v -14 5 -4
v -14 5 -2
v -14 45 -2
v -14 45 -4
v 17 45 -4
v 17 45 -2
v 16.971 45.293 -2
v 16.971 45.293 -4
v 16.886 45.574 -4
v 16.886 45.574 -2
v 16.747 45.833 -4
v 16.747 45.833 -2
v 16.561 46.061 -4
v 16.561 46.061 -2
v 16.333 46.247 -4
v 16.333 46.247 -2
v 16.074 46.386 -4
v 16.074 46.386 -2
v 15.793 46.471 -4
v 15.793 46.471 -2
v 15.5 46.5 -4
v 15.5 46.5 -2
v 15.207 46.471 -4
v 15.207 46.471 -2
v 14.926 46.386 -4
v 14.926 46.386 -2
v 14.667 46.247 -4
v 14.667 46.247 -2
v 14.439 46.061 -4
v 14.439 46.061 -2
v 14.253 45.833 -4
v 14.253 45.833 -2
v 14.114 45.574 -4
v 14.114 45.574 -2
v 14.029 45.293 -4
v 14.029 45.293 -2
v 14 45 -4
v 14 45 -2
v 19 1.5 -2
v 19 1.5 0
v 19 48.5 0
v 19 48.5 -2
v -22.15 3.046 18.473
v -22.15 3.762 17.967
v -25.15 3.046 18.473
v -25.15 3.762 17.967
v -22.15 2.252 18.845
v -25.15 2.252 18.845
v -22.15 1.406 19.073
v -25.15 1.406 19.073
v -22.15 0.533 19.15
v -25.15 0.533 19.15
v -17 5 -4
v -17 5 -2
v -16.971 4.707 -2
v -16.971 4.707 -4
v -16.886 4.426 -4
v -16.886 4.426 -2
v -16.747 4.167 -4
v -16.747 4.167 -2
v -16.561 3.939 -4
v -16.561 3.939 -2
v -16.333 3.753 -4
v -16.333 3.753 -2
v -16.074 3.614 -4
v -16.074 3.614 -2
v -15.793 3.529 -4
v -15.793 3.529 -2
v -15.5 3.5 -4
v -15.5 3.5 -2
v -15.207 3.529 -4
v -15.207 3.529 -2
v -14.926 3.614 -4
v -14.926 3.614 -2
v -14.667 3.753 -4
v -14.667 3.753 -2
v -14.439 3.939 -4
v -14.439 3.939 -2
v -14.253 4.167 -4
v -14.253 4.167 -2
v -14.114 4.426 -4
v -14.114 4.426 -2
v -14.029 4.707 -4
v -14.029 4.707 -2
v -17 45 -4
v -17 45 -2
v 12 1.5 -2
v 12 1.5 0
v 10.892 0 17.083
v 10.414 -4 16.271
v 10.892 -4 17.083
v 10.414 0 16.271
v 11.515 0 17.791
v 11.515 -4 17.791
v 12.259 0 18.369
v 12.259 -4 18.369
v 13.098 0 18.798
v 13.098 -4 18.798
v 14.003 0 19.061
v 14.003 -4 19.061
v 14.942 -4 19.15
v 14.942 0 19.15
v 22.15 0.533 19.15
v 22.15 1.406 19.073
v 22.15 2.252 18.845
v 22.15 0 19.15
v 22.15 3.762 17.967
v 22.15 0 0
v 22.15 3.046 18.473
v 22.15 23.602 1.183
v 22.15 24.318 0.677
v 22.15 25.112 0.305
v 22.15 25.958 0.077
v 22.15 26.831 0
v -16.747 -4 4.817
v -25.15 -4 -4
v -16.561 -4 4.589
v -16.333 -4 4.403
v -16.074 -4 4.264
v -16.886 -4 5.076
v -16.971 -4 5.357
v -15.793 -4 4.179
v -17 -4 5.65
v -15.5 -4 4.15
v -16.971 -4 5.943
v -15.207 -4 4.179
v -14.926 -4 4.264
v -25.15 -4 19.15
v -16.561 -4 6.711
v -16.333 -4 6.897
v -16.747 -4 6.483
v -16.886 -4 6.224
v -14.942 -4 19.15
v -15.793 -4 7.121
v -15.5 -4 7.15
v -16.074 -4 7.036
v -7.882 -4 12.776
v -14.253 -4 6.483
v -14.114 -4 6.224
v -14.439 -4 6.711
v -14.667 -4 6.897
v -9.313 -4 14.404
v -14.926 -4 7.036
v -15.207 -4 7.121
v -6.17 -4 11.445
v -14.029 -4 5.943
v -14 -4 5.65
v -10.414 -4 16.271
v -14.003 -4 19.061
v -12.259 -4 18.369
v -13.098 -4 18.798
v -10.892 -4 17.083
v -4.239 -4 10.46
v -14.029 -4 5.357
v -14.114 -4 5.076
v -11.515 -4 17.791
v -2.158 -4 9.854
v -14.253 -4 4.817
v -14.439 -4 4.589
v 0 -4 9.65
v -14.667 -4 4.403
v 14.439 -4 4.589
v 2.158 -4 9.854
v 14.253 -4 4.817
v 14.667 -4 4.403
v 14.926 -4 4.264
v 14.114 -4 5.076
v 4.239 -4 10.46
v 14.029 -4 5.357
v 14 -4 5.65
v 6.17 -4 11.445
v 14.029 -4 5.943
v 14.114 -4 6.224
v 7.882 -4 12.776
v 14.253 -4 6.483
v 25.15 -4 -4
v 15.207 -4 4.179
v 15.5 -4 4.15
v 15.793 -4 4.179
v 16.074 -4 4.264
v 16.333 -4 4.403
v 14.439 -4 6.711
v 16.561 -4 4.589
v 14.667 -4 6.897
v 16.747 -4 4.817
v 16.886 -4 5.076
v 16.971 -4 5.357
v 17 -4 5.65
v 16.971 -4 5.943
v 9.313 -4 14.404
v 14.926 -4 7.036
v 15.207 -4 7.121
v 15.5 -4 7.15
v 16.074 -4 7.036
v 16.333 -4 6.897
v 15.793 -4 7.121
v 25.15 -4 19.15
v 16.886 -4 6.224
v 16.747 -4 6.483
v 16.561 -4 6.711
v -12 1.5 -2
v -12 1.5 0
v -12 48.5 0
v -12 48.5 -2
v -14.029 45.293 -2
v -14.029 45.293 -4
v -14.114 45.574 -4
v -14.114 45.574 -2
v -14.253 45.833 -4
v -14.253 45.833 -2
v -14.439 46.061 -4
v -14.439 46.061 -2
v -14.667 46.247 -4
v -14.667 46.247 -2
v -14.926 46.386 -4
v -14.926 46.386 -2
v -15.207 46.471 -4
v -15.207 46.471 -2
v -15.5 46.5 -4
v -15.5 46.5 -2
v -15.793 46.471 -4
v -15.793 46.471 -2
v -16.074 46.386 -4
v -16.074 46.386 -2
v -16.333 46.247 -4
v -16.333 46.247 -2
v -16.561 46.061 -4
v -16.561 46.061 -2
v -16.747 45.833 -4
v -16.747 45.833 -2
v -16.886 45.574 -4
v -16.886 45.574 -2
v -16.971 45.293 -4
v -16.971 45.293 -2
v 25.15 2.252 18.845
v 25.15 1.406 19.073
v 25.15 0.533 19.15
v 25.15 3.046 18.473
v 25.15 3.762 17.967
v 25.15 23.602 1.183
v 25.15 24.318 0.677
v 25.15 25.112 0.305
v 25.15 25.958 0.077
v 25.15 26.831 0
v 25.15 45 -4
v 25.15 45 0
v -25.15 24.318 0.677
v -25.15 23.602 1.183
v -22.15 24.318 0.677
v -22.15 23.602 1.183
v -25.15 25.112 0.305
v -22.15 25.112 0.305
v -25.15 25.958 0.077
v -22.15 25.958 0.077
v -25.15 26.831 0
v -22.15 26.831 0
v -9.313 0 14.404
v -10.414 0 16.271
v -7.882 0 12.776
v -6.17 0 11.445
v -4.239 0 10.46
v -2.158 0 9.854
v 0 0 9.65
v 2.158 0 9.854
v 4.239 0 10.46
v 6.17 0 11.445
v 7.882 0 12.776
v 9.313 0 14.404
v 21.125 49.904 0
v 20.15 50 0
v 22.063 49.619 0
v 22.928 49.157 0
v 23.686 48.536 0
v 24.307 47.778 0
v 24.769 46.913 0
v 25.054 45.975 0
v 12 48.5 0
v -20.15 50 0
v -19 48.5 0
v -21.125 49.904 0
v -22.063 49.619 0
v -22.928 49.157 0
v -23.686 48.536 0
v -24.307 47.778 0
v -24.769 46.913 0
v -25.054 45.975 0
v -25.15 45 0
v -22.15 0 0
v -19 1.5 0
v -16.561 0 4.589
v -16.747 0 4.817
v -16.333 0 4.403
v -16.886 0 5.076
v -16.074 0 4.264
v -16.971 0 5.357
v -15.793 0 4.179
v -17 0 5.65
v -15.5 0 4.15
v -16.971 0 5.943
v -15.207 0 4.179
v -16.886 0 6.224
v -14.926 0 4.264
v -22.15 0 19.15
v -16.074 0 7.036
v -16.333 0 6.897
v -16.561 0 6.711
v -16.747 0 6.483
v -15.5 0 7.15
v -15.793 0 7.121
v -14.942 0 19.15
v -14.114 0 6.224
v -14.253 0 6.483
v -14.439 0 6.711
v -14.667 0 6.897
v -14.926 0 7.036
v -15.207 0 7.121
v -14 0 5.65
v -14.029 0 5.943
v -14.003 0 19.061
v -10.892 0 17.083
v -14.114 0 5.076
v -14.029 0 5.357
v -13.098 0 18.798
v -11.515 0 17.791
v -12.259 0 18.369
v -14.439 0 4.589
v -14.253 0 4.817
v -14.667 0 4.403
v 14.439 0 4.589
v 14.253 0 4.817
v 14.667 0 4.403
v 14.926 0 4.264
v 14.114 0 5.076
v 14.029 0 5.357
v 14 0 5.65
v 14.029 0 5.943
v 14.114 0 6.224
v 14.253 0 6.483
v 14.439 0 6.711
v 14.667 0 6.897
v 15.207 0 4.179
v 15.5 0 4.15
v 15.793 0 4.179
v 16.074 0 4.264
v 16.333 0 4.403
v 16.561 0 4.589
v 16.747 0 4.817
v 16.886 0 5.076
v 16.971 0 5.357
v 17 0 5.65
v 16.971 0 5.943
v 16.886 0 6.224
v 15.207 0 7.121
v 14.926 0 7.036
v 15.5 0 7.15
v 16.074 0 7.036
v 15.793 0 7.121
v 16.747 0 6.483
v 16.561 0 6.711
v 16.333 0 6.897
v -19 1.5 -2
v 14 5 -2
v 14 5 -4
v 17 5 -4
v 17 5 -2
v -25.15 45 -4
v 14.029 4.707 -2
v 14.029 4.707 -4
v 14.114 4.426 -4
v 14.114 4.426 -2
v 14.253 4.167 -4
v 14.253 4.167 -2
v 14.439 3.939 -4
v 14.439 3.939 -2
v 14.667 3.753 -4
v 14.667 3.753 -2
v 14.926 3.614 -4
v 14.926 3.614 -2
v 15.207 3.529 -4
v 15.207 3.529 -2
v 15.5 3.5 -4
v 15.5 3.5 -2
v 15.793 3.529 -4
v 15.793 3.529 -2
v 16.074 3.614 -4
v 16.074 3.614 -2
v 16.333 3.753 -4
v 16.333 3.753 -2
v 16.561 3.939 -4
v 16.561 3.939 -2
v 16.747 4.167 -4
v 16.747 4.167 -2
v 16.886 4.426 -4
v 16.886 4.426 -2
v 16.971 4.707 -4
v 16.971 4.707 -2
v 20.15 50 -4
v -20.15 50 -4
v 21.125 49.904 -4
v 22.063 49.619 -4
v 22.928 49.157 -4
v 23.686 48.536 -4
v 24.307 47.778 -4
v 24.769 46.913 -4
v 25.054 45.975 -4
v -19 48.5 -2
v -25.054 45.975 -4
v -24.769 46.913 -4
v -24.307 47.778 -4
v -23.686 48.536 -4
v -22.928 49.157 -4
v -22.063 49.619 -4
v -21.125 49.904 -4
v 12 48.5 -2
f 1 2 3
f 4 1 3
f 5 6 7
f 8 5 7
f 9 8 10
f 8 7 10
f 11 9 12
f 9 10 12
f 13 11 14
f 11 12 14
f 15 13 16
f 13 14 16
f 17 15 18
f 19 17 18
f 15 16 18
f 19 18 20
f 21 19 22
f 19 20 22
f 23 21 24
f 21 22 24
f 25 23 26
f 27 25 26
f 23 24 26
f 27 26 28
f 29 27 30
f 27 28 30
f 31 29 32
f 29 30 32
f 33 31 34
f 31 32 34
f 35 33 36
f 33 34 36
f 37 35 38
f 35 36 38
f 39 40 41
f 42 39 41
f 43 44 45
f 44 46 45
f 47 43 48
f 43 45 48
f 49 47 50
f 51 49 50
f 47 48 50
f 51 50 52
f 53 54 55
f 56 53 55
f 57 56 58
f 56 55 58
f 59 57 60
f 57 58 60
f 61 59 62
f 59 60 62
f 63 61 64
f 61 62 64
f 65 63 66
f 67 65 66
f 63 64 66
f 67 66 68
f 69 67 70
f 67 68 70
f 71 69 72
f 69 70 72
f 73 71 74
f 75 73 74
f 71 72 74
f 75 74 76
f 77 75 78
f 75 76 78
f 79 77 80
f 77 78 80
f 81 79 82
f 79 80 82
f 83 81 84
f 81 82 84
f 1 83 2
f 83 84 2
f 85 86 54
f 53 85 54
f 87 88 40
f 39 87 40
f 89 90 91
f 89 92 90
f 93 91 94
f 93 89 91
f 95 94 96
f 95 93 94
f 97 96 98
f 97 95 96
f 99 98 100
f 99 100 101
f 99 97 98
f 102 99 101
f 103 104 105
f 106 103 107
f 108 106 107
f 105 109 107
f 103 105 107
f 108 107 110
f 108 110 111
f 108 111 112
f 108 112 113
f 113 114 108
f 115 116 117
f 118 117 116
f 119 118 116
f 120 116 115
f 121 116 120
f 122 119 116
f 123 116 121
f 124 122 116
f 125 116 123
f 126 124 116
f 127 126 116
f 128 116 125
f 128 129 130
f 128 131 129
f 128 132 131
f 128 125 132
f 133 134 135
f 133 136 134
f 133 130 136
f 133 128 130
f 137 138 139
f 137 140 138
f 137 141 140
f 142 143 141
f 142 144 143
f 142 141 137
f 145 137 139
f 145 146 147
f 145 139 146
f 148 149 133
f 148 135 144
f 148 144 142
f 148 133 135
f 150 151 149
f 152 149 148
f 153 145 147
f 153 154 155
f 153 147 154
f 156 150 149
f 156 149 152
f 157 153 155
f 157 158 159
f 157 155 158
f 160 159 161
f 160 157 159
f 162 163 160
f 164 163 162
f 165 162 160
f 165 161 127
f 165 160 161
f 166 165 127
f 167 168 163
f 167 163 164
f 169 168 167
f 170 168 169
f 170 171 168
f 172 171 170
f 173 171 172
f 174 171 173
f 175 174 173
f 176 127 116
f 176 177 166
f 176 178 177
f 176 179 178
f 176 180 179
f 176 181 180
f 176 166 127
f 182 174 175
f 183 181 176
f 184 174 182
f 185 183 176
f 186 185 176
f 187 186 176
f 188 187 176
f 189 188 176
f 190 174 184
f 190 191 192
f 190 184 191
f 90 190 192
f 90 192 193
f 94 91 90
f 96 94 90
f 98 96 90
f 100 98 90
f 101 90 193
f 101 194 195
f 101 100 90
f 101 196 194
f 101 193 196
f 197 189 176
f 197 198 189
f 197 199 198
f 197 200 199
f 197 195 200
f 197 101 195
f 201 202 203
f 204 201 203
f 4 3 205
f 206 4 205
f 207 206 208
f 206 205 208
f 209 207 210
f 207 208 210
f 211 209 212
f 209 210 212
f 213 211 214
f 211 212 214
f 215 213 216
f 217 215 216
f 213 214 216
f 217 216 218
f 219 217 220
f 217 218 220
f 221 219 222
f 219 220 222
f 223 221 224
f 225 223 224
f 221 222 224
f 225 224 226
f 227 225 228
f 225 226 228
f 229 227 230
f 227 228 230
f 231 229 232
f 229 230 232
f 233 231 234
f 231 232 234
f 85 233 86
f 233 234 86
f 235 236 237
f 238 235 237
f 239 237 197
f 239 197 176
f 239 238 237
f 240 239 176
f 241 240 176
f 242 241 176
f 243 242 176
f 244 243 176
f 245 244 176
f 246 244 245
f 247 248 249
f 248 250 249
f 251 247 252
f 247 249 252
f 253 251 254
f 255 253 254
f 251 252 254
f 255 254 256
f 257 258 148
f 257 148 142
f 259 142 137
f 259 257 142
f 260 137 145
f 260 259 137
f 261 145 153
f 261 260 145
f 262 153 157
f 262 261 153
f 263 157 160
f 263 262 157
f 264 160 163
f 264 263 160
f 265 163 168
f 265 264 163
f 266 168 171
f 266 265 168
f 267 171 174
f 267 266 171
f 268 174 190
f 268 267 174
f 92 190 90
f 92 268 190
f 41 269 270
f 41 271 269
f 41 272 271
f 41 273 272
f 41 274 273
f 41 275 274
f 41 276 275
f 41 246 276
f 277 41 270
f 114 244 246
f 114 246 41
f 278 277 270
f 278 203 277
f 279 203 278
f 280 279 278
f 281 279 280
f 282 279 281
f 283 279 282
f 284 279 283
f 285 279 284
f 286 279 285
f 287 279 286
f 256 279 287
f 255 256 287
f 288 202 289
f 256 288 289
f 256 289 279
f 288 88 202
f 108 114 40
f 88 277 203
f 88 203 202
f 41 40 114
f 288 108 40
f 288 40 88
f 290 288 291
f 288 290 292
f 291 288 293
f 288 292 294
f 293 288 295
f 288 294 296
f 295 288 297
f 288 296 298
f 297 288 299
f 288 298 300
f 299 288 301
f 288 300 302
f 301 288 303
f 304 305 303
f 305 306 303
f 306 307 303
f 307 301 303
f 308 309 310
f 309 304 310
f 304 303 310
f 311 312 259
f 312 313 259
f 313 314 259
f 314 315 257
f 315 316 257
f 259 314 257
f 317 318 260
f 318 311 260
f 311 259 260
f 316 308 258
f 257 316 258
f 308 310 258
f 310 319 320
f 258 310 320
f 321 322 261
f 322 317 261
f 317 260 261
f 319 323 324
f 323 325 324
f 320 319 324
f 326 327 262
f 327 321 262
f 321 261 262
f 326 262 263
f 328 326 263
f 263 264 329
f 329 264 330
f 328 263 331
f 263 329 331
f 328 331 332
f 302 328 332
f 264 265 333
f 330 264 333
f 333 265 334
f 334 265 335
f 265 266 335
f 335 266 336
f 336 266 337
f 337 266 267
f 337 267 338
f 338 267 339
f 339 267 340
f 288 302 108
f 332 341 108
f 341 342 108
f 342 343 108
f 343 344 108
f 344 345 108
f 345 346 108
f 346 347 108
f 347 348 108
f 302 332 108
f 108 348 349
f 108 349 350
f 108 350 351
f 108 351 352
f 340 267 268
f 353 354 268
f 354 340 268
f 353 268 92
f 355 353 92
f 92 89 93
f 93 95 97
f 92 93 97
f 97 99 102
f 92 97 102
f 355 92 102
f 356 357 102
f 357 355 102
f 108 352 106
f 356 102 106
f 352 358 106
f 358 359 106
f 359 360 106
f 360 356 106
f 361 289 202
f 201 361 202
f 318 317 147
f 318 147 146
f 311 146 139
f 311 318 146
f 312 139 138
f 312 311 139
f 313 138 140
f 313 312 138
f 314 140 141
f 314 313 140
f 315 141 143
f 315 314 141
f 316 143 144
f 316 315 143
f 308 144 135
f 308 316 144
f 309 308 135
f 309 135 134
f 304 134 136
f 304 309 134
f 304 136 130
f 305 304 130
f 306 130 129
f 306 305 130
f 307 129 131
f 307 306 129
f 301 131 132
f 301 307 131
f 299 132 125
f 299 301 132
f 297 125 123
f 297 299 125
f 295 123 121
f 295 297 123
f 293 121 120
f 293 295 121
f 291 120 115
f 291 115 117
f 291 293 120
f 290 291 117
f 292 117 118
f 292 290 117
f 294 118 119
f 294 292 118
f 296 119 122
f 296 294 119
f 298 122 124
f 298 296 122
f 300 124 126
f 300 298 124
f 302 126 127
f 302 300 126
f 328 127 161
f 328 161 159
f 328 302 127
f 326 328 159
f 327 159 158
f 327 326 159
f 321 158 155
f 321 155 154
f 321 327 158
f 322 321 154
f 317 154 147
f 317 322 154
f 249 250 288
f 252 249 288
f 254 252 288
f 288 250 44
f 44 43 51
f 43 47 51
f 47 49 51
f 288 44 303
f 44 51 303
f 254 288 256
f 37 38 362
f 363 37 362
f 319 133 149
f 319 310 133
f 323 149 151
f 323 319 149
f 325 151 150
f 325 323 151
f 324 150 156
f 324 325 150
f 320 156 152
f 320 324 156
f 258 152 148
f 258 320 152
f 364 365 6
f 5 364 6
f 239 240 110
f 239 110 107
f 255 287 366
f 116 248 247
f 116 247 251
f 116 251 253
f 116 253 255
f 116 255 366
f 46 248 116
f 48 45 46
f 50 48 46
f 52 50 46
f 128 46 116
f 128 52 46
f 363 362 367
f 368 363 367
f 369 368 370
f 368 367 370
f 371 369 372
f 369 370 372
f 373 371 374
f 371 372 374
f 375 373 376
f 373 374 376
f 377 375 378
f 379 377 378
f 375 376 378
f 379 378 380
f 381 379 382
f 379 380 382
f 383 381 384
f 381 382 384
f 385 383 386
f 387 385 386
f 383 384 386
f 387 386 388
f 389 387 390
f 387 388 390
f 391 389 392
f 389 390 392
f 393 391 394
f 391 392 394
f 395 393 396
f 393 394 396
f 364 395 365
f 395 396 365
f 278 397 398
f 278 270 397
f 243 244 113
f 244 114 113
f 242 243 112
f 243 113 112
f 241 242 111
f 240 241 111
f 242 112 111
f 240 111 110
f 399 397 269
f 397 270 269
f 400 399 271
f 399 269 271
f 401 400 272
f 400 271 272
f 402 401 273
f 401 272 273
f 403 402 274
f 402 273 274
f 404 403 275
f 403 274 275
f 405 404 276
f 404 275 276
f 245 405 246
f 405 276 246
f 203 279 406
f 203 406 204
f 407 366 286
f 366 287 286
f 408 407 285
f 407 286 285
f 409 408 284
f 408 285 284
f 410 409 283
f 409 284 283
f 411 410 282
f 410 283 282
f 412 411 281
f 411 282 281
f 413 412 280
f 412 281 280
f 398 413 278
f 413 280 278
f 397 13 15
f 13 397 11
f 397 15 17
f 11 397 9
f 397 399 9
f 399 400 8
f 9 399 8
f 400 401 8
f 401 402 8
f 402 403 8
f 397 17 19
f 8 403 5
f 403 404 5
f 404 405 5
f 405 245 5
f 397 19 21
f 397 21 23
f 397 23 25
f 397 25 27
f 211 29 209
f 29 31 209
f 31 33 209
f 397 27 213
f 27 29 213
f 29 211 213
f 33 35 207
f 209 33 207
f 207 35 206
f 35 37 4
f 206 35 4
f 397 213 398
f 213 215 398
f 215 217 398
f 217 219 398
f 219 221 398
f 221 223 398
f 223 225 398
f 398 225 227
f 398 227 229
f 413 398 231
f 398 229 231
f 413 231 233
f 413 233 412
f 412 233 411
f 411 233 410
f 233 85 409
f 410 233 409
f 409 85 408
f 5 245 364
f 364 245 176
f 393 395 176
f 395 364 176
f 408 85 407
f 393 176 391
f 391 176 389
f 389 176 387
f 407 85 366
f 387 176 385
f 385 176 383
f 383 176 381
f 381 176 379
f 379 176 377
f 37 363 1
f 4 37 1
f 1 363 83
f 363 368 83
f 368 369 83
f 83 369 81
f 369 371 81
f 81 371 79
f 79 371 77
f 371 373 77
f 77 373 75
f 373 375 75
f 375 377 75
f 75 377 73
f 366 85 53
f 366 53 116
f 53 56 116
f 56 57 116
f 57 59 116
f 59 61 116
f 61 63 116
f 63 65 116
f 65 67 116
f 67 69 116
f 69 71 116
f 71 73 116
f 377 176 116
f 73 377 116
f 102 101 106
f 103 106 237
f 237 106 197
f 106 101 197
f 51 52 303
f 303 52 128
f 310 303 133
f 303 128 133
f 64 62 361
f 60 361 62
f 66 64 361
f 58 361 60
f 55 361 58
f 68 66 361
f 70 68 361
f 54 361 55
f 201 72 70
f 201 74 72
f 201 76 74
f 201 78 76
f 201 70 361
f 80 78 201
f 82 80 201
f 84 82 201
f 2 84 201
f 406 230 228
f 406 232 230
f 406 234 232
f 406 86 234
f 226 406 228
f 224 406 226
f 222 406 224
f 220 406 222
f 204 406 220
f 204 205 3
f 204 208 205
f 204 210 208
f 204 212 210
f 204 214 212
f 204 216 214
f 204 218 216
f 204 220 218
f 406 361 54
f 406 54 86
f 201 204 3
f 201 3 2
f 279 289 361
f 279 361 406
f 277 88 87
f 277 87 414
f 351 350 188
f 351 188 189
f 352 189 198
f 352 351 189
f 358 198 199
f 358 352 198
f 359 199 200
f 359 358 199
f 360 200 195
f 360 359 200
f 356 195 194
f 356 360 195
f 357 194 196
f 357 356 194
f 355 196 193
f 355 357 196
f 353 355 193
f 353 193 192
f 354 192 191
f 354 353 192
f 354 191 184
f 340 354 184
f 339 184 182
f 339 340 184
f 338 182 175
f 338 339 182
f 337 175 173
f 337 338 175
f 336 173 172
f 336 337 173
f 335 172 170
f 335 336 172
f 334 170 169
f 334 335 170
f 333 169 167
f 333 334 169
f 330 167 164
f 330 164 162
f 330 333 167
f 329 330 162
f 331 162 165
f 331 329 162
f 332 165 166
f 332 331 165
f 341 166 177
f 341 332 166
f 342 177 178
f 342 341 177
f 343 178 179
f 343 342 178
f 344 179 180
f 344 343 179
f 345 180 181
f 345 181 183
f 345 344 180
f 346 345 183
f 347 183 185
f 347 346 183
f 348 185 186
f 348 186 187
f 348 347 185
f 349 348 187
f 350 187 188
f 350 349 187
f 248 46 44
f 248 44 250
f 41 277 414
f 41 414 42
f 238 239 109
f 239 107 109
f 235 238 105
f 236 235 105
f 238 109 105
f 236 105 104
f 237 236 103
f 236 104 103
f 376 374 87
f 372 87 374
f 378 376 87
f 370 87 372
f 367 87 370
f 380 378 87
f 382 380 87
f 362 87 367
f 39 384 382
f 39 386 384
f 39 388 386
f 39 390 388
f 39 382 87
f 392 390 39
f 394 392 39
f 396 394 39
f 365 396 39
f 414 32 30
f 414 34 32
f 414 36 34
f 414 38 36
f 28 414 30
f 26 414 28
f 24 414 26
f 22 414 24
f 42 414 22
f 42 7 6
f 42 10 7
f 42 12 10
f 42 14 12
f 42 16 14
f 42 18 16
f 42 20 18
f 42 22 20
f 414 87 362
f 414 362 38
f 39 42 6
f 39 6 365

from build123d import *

# Parameters (mm, degrees)
F0_W      = 50.3
F0_H      = 46.3
F0_R      = 1.5
F0_R_2    = 11.5
F1_DEPTH  = 4
F2_W      = 50.3
F2_H      = 4
F3_DEPTH  = 50
F5_DEPTH  = 3
F7_DEPTH  = 3
F9_DEPTH  = 4.001
F10_W     = 7
F10_H     = 47
F11_DEPTH = 2
F12_W     = 50.3
F12_H     = 23.15
F13_DEPTH = 54.001
F14_R     = 5


with BuildPart() as f1:
    # F0 (on Front) → F1 (new body)
    with BuildSketch(Plane.XZ):
        with Locations((0, 19.15)):
            Rectangle(F0_W, F0_H)
        with Locations((-15.5, 5.65)):
            Circle(F0_R, mode=Mode.SUBTRACT)
        with Locations((15.5, 5.65)):
            Circle(F0_R, mode=Mode.SUBTRACT)
        with Locations((-15.5, 36.65)):
            Circle(F0_R, mode=Mode.SUBTRACT)
        with Locations((0, 21.15)):
            Circle(F0_R_2, mode=Mode.SUBTRACT)
        with Locations((15.5, 36.65)):
            Circle(F0_R, mode=Mode.SUBTRACT)
    extrude(amount=F1_DEPTH)

    # F2 (on face) → F3 (join)
    with BuildSketch(Plane(origin=(0, 0, 0), x_dir=(-1, 0, 0), z_dir=(0, 1, 0))):
        with Locations((0, -2)):
            Rectangle(F2_W, F2_H)
    extrude(amount=F3_DEPTH)

    # F4 (on face) → F5 (join)
    with BuildSketch(Plane.YZ.offset(25.15)):
        Polygon((25, 0), (0, 21.15), (0, 0), align=None)
    extrude(amount=-F5_DEPTH)

    # F6 (on face) → F7 (join)
    with BuildSketch(Plane(origin=(-25.15, 0, 0), x_dir=(0, -1, 0), z_dir=(-1, 0, 0))):
        Polygon((0, 0), (0, 21.15), (-25, 0), align=None)
    extrude(amount=-F7_DEPTH)

    # F8 (on face) → F9 (cut, through all)
    with BuildSketch(Plane.XY):
        with BuildLine():
            Line((-14, 5), (-14, 45))
            ThreePointArc((-14, 45), (-15.5, 46.5), (-17, 45))
            Line((-17, 45), (-17, 5))
            ThreePointArc((-17, 5), (-15.5, 3.5), (-14, 5))
        make_face()
        with BuildLine():
            ThreePointArc((17, 45), (15.5, 46.5), (14, 45))
            Line((14, 45), (14, 5))
            ThreePointArc((14, 5), (15.5, 3.5), (17, 5))
            Line((17, 5), (17, 45))
        make_face()
    extrude(amount=-F9_DEPTH, mode=Mode.SUBTRACT)

    # F10 (on face) → F11 (cut)
    with BuildSketch(Plane.XY):
        with Locations((-15.5, 25)):
            Rectangle(F10_W, F10_H)
        with Locations((15.5, 25)):
            Rectangle(F10_W, F10_H)
    extrude(amount=-F11_DEPTH, mode=Mode.SUBTRACT)

    # F12 (on face) → F13 (cut, through all)
    with BuildSketch(Plane.XZ.offset(4)):
        with Locations((0, 30.725)):
            Rectangle(F12_W, F12_H)
    extrude(amount=-F13_DEPTH, mode=Mode.SUBTRACT)

    # F14
    f14_edges = [f1.edges().sort_by_distance(p)[0] for p in [
        (23.65, 2.364066, 19.15),
        (-23.65, 2.364066, 19.15),
        (11.324752, -2, 19.15),
        (-11.324752, -2, 19.15),
        (23.65, 25, 0),
        (-23.65, 25, 0),
        (25.15, 50, -2),
        (-25.15, 50, -2),
    ]]
    fillet(f14_edges, radius=F14_R)


solid = f1.part
